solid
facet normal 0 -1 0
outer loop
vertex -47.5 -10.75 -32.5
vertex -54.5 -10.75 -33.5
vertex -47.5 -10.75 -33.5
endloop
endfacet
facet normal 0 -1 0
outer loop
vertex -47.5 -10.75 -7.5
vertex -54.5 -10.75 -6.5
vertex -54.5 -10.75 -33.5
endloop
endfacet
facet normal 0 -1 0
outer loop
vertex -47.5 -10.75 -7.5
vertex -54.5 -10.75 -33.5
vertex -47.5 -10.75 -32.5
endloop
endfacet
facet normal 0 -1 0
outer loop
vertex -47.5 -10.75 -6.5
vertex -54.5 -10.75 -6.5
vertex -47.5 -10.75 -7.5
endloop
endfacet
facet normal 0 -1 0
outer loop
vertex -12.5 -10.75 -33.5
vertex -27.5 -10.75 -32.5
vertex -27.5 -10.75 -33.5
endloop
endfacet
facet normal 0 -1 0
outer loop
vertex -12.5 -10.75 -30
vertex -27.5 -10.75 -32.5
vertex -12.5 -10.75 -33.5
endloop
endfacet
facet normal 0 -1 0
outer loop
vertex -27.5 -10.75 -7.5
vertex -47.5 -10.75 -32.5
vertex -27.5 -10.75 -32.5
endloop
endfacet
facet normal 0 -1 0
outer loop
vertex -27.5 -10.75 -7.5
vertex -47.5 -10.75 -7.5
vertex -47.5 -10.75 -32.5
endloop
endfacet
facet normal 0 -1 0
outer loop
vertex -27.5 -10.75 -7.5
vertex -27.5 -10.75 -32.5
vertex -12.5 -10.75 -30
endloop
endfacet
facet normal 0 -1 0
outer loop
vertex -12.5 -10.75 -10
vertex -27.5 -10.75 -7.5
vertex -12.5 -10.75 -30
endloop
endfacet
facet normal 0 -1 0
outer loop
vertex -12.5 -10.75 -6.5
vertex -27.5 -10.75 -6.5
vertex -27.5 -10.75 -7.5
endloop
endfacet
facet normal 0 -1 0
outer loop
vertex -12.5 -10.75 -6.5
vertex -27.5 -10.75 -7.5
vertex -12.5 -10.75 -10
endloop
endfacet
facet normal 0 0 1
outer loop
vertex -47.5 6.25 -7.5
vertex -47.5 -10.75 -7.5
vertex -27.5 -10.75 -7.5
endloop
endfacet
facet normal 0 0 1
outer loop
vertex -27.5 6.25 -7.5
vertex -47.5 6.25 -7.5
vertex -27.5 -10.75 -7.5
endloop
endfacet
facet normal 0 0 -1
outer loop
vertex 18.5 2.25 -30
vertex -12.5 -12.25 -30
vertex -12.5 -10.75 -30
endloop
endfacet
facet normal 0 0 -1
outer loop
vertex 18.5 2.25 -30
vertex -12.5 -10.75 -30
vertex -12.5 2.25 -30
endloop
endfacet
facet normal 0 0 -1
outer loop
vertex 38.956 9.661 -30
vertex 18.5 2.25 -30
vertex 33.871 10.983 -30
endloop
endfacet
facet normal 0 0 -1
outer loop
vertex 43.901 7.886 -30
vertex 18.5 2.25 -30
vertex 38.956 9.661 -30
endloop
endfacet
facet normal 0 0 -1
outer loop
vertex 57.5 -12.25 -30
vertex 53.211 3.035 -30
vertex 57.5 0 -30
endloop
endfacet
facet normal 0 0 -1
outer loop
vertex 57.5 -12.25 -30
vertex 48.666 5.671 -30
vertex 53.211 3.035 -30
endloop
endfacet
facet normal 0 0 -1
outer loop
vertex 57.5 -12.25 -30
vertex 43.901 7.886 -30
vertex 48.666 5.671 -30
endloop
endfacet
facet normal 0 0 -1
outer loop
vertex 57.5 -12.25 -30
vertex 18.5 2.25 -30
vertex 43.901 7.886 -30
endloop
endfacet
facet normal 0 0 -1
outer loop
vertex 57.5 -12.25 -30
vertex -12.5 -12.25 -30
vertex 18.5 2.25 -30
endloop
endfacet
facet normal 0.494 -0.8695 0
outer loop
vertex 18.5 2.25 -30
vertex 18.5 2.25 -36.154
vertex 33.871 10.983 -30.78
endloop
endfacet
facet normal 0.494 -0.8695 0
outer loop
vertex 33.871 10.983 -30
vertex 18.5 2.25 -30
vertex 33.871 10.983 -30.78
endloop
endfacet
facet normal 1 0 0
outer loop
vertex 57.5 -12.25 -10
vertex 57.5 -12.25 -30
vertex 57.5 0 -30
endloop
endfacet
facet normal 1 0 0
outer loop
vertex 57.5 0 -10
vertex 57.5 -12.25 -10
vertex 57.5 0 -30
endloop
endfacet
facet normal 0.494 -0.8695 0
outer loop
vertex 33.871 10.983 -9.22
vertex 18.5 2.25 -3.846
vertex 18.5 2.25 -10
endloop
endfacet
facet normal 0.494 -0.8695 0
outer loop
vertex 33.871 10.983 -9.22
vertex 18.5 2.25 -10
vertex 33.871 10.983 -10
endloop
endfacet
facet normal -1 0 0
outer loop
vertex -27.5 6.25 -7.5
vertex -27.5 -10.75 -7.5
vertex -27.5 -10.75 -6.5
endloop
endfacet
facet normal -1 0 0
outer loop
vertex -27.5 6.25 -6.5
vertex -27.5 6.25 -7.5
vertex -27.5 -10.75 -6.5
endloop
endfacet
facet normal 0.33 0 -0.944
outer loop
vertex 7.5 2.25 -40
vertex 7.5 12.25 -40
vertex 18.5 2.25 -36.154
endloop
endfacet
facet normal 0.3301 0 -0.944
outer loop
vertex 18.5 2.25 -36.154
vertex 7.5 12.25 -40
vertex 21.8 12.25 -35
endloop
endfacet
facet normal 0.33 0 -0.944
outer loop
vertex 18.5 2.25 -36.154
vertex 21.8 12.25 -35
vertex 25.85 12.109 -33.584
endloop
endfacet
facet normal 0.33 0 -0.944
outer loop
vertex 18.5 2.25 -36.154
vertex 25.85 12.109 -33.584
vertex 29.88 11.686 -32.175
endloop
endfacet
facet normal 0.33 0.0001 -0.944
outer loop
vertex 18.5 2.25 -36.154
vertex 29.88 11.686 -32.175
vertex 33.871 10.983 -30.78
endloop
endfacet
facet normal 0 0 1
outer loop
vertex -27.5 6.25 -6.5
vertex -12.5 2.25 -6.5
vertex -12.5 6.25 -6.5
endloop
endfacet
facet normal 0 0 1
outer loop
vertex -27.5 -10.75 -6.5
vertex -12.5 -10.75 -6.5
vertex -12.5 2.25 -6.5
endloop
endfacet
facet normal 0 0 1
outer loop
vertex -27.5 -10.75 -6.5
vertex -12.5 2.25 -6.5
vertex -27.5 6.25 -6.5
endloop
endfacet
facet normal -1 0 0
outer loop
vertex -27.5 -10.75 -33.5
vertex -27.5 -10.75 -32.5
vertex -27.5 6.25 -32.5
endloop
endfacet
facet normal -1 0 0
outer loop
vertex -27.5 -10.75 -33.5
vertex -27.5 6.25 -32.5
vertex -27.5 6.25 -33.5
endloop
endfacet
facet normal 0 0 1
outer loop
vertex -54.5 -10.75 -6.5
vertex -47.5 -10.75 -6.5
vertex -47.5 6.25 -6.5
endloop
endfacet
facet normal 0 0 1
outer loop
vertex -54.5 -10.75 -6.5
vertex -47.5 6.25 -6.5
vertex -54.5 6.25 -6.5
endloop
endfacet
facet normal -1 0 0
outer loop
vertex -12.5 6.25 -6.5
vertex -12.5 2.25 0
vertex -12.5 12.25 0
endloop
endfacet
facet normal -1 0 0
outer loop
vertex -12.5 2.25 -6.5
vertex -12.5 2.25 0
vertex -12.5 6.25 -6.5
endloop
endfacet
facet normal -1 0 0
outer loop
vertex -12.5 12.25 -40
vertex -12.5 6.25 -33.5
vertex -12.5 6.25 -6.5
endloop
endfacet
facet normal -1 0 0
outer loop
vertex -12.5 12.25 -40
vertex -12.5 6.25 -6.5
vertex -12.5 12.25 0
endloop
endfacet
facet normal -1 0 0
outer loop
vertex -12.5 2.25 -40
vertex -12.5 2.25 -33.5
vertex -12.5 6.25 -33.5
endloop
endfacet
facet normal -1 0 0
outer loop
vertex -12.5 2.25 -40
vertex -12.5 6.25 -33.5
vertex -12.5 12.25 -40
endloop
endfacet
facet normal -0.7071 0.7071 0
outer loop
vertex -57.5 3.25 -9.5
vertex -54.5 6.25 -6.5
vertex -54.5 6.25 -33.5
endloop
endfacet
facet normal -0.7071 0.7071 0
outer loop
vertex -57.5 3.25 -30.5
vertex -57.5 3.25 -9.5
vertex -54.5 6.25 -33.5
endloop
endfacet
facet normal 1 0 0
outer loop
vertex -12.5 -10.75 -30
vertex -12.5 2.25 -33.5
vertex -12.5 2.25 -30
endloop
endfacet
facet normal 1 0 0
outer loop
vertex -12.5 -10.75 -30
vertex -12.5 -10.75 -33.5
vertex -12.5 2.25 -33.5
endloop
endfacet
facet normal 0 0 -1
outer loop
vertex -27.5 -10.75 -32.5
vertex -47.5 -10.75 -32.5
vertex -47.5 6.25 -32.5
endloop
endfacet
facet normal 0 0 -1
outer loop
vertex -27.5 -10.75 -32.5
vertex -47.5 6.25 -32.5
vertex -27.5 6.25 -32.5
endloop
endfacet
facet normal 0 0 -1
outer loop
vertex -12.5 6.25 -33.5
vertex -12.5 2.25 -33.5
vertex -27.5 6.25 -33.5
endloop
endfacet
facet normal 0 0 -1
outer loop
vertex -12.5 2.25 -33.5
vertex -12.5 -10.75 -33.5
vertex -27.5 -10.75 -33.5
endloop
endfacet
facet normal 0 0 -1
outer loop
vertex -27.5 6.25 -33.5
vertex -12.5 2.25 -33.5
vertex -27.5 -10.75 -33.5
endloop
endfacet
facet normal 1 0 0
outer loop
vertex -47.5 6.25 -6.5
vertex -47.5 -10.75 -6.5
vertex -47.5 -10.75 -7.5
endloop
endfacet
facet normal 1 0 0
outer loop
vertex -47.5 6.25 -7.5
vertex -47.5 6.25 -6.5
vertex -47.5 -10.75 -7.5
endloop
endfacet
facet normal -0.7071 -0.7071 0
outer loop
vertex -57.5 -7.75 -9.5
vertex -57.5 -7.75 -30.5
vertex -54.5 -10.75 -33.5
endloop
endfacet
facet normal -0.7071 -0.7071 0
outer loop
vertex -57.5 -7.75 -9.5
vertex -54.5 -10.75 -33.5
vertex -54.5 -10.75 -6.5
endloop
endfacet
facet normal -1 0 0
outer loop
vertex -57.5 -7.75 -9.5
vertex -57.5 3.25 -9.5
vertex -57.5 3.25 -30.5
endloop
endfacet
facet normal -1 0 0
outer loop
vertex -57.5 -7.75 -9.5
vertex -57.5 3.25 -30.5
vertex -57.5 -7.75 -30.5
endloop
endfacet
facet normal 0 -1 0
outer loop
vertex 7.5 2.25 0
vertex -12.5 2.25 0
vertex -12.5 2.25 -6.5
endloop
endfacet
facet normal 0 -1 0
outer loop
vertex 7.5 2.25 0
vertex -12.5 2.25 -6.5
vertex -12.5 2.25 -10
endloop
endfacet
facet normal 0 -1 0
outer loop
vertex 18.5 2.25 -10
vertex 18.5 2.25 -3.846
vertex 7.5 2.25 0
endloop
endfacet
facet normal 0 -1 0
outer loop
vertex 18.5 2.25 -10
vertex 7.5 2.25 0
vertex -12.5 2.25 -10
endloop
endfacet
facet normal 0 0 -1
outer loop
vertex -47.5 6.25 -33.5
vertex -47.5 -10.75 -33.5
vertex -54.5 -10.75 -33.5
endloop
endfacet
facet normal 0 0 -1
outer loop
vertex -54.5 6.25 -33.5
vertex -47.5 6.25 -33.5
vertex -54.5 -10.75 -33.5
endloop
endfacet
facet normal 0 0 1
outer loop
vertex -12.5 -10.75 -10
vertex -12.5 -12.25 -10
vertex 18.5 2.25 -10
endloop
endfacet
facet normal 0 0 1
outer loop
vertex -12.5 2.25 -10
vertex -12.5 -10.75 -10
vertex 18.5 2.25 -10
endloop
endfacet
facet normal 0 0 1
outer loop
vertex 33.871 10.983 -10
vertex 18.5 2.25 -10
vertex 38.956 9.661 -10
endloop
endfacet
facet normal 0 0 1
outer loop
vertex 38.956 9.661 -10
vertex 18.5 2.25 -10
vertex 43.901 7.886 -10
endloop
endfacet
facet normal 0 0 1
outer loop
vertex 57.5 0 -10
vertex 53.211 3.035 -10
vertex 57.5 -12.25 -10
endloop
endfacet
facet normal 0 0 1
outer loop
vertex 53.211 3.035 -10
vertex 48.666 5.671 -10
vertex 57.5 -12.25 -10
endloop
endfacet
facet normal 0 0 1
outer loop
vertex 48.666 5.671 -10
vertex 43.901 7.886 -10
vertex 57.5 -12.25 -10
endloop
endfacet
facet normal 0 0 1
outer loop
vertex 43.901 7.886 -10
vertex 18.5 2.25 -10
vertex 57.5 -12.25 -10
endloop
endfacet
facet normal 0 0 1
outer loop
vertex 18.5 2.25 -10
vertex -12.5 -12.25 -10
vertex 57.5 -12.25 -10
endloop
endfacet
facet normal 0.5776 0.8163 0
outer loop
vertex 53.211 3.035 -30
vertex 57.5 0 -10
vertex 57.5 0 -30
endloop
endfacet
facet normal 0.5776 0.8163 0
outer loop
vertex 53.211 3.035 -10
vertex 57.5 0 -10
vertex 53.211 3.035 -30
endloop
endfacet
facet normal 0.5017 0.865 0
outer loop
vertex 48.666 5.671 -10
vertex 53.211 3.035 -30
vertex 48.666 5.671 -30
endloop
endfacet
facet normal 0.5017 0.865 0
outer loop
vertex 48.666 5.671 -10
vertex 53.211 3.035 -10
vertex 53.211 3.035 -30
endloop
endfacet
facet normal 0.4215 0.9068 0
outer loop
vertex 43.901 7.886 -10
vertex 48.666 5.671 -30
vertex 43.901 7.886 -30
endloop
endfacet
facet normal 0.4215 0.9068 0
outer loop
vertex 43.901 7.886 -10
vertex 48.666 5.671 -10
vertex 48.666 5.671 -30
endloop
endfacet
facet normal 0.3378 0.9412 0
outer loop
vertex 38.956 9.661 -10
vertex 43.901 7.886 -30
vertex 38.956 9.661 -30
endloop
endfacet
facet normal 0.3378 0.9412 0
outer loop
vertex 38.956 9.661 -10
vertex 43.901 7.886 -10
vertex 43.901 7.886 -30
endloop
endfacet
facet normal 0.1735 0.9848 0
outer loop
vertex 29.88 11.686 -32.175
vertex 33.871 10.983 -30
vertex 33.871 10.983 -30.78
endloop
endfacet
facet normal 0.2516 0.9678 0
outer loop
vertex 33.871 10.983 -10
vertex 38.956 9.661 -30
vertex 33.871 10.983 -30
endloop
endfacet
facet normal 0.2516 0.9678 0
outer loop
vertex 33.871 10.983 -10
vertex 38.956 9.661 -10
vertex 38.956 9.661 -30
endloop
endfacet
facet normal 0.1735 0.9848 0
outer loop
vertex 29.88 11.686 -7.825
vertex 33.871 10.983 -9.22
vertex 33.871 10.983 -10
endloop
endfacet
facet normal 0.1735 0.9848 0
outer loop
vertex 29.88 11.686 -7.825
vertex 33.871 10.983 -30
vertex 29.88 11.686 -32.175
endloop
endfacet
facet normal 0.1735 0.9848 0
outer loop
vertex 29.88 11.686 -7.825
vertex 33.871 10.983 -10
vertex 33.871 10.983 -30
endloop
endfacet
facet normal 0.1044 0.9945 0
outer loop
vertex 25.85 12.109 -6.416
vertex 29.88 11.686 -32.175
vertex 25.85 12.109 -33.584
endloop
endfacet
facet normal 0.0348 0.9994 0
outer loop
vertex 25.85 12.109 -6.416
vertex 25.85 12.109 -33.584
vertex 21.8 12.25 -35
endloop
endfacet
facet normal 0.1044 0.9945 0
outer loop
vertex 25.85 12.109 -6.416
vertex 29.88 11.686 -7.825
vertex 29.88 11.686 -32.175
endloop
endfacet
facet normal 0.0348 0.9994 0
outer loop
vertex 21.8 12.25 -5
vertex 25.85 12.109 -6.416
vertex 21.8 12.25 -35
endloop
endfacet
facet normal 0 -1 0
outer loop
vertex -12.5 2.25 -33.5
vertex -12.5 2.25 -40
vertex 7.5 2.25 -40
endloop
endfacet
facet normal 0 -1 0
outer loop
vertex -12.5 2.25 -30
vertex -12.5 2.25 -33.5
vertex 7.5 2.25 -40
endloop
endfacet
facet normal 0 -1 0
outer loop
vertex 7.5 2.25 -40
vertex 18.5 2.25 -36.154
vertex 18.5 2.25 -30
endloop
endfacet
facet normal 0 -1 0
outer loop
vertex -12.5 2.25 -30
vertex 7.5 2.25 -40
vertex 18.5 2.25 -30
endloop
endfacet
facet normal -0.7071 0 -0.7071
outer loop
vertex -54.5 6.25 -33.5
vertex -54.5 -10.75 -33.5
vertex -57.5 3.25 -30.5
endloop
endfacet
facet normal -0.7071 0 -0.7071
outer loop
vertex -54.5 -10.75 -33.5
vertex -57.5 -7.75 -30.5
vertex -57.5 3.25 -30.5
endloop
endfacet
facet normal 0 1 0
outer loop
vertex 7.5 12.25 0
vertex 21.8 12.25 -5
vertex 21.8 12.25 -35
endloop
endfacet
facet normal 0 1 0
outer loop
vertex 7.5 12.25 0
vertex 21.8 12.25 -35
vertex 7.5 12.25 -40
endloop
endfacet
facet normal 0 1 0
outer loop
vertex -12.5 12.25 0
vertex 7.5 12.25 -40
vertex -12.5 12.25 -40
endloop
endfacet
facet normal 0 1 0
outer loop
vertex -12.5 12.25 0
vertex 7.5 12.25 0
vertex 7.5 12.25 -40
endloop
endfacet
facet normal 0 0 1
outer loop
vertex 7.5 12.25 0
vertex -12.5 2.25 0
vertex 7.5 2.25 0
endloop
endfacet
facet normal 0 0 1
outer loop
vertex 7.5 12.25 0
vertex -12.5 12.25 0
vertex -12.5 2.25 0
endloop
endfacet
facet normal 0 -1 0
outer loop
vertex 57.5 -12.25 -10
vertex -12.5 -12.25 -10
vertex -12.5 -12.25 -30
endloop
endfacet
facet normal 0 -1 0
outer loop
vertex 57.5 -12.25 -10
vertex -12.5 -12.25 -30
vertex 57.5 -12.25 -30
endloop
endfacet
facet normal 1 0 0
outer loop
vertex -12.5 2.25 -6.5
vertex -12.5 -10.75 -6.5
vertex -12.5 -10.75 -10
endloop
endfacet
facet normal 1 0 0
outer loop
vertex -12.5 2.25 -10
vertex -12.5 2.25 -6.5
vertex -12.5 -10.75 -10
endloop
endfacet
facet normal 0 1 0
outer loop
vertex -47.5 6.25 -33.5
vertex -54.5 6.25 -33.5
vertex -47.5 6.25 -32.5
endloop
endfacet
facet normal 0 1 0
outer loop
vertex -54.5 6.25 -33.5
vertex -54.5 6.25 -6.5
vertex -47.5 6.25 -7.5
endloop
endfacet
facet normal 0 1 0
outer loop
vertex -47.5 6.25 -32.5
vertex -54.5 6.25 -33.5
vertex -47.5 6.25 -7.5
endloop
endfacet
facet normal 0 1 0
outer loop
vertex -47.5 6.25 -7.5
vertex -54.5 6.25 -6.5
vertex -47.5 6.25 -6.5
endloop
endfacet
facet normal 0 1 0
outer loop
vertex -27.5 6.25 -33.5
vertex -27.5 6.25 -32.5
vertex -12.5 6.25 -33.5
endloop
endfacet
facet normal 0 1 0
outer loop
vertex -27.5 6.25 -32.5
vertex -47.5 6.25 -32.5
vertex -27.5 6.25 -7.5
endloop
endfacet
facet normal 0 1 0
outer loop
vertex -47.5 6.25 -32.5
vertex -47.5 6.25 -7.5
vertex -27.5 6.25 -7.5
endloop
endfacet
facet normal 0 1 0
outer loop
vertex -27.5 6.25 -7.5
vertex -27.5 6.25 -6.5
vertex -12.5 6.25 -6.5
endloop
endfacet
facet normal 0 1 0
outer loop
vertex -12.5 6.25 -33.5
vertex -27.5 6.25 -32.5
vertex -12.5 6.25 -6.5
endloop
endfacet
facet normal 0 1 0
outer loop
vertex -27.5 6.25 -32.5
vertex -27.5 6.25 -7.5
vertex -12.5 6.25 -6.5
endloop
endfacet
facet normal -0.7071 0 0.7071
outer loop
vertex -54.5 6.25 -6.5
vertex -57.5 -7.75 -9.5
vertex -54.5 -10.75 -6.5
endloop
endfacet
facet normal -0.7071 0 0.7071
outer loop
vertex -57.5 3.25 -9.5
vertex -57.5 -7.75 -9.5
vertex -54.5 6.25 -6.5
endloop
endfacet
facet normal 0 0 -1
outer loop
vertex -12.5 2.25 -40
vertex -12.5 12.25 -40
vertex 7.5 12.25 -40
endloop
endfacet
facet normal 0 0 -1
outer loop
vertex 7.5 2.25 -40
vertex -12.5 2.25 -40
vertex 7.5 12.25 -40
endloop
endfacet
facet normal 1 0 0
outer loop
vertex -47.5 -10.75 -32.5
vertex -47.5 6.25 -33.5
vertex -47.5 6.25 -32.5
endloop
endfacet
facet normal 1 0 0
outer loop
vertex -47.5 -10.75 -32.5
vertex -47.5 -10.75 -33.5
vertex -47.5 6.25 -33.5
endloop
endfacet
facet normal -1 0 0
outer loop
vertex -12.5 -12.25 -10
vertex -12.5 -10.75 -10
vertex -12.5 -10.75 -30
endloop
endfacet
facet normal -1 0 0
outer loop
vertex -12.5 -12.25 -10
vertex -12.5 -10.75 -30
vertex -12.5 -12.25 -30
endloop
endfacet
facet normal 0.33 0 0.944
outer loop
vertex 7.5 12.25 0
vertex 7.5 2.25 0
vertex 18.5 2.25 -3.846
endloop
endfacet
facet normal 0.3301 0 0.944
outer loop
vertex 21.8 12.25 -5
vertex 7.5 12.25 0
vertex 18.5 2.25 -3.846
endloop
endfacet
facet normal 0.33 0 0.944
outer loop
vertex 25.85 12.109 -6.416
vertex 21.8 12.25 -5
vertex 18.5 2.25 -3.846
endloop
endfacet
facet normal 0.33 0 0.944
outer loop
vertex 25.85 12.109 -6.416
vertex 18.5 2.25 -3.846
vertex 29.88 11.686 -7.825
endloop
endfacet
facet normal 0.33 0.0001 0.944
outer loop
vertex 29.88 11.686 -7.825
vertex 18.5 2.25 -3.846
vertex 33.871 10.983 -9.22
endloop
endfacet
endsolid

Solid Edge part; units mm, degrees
sketch "Sketch1" plane through (0, 0, 0) normal (0, 0, 1) x (1, 0, 0)
  line L0 (-57.5, -12.25) -> (57.5, -12.25)
  line L1 (57.5, -12.25) -> (57.5, 12.25)
  line L2 (57.5, 12.25) -> (-57.5, 12.25)
  line L3 (-57.5, 12.25) -> (-57.5, -12.25)
extrude "Protrusion1" add sketch "Sketch1" against normal blind 40
sketch "Sketch2" plane through (0, -12.25, -20) normal (0, -1, 0) x (1, 0, 0)
  line L0 (-57.5, 20) -> (-12.5, 20)
  line L1 (-12.5, 20) -> (-12.5, 13.5)
  line L2 (-12.5, 13.5) -> (-57.5, 13.5)
  line L3 (-57.5, 13.5) -> (-57.5, 20)
  line L4 (-57.5, -20) -> (-12.5, -20)
  line L5 (-12.5, -20) -> (-12.5, -13.5)
  line L6 (-12.5, -13.5) -> (-57.5, -13.5)
  line L7 (-57.5, -13.5) -> (-57.5, -20)
extrude "ExtrudedCutout_1" cut sketch "Sketch2" against normal blind 24.5
sketch "Sketch3" plane through (0, -12.25, -20) normal (0, -1, 0) x (1, 0, 0)
  line L0 (57.5, 20) -> (-12.5, 20)
  line L1 (-12.5, 20) -> (-12.5, 10)
  line L2 (-12.5, 10) -> (57.5, 10)
  line L3 (57.5, 10) -> (57.5, 20)
  line L4 (57.5, -20) -> (-12.5, -20)
  line L5 (-12.5, -20) -> (-12.5, -10)
  line L6 (-12.5, -10) -> (57.5, -10)
  line L7 (57.5, -10) -> (57.5, -20)
extrude "ExtrudedCutout_2" cut sketch "Sketch3" against normal blind 14.5
sketch "Sketch4" plane through (0, -12.25, -20) normal (0, -1, 0) x (1, 0, 0)
  line L0 (-47.5, 13.5) -> (-47.5, 12.5)
  line L1 (-47.5, 12.5) -> (-27.5, 12.5)
  line L2 (-27.5, 12.5) -> (-27.5, 13.5)
  line L3 (-27.5, 13.5) -> (-47.5, 13.5)
  line L4 (-47.5, -13.5) -> (-47.5, -12.5)
  line L5 (-47.5, -12.5) -> (-27.5, -12.5)
  line L6 (-27.5, -12.5) -> (-27.5, -13.5)
  line L7 (-27.5, -13.5) -> (-47.5, -13.5)
extrude "ExtrudedCutout_3" cut sketch "Sketch4" against normal blind 24.5
sketch "Sketch5" plane through (-20, 0, -6.5) normal (0, 0, 1) x (1, 0, 0)
  line L0 (-37.5, 12.25) -> (-37.5, 6.25)
  line L1 (-37.5, 6.25) -> (7.5, 6.25)
  line L2 (7.5, 6.25) -> (7.5, 12.25)
  line L3 (7.5, 12.25) -> (-37.5, 12.25)
  line L4 (-37.5, -12.25) -> (-37.5, -10.75)
  line L5 (-37.5, -10.75) -> (7.5, -10.75)
  line L6 (7.5, -10.75) -> (7.5, -12.25)
  line L7 (7.5, -12.25) -> (-37.5, -12.25)
extrude "ExtrudedCutout_4" cut sketch "Sketch5" against normal blind 40
sketch "Sketch6" plane through (22.5, -12.25, -20) normal (0, -1, 0) x (0, 0, 1)
  line L0 (20, -35) -> (20, -13.6)
  line L1 (20, -13.6) -> (10, -13.6)
  line L2 (10, -13.6) -> (10, -35)
  line L3 (10, -35) -> (20, -35)
extrude "ExtrudedCutout_5" cut sketch "Sketch6" against normal blind 34.9193
sketch "Sketch7" plane through (22.5, 2.25, -35) normal (0, -1, 0) x (1, 0, 0)
  line L0 (35, 5) -> (13.6, 5)
  line L1 (13.6, 5) -> (13.6, -5)
  line L2 (13.6, -5) -> (35, -5)
  line L3 (35, -5) -> (35, 5)
extrude "ExtrudedCutout_6" cut sketch "Sketch7" against normal blind 93.3643
sketch "Sketch8" plane through (22.5, -12.25, -20) normal (0, -1, 0) x (1, 0, 0)
  line L0 (-15, 20) -> (13.6, 10)
  line L1 (13.6, 10) -> (13.6, 20)
  line L2 (13.6, 20) -> (-15, 20)
extrude "ExtrudedCutout_7" cut sketch "Sketch8" against normal blind 164.1639
sketch "Sketch9" plane through (0, 0, 0) normal (0, 0, 1) x (1, 0, 0)
  line L0 (18.5, 2.25) -> (36.1, 12.25)
  line L1 (36.1, 12.25) -> (36.1, 2.25)
  line L2 (36.1, 2.25) -> (18.5, 2.25)
extrude "ExtrudedCutout_10" cut sketch "Sketch9" against normal blind 10
sketch "Sketch10" plane through (11.8, 7.25, -40) normal (0, 0, -1) x (0, -1, 0)
  line L0 (5, -6.7) -> (-5, -24.3)
  line L1 (-5, -24.3) -> (5, -24.3)
  line L2 (5, -24.3) -> (5, -6.7)
extrude "ExtrudedCutout_11" cut sketch "Sketch10" against normal blind 10
sketch "Sketch11" plane through (22.5, 12.25, -20) normal (0, 1, 0) x (0, 0, -1)
  line L0 (20, 15) -> (10, -13.6)
  line L1 (10, -13.6) -> (20, -13.6)
  line L2 (20, -13.6) -> (20, 15)
extrude "ExtrudedCutout_12" cut sketch "Sketch11" against normal blind 63.6065
sketch "Sketch12" plane through (0, 0, 0) normal (0, 0, 1) x (1, 0, 0)
  line L0 (57.5, 12.25) -> (57.5, 0)
  arc A0 (21.8, 12.25) -> (57.5, 0) centre (21.8, -45.895) cw
  line L1 (57.5, 12.25) -> (21.8, 12.25)
extrude "ExtrudedCutout_15" cut sketch "Sketch12" against normal blind 40
chamfer "Chamfer_1" distance 3 angle 45 4 edges at (-57.5, -2.25, -6.5) (-57.5, 6.25, -20) (-57.5, -2.25, -33.5) (-57.5, -10.75, -20)
